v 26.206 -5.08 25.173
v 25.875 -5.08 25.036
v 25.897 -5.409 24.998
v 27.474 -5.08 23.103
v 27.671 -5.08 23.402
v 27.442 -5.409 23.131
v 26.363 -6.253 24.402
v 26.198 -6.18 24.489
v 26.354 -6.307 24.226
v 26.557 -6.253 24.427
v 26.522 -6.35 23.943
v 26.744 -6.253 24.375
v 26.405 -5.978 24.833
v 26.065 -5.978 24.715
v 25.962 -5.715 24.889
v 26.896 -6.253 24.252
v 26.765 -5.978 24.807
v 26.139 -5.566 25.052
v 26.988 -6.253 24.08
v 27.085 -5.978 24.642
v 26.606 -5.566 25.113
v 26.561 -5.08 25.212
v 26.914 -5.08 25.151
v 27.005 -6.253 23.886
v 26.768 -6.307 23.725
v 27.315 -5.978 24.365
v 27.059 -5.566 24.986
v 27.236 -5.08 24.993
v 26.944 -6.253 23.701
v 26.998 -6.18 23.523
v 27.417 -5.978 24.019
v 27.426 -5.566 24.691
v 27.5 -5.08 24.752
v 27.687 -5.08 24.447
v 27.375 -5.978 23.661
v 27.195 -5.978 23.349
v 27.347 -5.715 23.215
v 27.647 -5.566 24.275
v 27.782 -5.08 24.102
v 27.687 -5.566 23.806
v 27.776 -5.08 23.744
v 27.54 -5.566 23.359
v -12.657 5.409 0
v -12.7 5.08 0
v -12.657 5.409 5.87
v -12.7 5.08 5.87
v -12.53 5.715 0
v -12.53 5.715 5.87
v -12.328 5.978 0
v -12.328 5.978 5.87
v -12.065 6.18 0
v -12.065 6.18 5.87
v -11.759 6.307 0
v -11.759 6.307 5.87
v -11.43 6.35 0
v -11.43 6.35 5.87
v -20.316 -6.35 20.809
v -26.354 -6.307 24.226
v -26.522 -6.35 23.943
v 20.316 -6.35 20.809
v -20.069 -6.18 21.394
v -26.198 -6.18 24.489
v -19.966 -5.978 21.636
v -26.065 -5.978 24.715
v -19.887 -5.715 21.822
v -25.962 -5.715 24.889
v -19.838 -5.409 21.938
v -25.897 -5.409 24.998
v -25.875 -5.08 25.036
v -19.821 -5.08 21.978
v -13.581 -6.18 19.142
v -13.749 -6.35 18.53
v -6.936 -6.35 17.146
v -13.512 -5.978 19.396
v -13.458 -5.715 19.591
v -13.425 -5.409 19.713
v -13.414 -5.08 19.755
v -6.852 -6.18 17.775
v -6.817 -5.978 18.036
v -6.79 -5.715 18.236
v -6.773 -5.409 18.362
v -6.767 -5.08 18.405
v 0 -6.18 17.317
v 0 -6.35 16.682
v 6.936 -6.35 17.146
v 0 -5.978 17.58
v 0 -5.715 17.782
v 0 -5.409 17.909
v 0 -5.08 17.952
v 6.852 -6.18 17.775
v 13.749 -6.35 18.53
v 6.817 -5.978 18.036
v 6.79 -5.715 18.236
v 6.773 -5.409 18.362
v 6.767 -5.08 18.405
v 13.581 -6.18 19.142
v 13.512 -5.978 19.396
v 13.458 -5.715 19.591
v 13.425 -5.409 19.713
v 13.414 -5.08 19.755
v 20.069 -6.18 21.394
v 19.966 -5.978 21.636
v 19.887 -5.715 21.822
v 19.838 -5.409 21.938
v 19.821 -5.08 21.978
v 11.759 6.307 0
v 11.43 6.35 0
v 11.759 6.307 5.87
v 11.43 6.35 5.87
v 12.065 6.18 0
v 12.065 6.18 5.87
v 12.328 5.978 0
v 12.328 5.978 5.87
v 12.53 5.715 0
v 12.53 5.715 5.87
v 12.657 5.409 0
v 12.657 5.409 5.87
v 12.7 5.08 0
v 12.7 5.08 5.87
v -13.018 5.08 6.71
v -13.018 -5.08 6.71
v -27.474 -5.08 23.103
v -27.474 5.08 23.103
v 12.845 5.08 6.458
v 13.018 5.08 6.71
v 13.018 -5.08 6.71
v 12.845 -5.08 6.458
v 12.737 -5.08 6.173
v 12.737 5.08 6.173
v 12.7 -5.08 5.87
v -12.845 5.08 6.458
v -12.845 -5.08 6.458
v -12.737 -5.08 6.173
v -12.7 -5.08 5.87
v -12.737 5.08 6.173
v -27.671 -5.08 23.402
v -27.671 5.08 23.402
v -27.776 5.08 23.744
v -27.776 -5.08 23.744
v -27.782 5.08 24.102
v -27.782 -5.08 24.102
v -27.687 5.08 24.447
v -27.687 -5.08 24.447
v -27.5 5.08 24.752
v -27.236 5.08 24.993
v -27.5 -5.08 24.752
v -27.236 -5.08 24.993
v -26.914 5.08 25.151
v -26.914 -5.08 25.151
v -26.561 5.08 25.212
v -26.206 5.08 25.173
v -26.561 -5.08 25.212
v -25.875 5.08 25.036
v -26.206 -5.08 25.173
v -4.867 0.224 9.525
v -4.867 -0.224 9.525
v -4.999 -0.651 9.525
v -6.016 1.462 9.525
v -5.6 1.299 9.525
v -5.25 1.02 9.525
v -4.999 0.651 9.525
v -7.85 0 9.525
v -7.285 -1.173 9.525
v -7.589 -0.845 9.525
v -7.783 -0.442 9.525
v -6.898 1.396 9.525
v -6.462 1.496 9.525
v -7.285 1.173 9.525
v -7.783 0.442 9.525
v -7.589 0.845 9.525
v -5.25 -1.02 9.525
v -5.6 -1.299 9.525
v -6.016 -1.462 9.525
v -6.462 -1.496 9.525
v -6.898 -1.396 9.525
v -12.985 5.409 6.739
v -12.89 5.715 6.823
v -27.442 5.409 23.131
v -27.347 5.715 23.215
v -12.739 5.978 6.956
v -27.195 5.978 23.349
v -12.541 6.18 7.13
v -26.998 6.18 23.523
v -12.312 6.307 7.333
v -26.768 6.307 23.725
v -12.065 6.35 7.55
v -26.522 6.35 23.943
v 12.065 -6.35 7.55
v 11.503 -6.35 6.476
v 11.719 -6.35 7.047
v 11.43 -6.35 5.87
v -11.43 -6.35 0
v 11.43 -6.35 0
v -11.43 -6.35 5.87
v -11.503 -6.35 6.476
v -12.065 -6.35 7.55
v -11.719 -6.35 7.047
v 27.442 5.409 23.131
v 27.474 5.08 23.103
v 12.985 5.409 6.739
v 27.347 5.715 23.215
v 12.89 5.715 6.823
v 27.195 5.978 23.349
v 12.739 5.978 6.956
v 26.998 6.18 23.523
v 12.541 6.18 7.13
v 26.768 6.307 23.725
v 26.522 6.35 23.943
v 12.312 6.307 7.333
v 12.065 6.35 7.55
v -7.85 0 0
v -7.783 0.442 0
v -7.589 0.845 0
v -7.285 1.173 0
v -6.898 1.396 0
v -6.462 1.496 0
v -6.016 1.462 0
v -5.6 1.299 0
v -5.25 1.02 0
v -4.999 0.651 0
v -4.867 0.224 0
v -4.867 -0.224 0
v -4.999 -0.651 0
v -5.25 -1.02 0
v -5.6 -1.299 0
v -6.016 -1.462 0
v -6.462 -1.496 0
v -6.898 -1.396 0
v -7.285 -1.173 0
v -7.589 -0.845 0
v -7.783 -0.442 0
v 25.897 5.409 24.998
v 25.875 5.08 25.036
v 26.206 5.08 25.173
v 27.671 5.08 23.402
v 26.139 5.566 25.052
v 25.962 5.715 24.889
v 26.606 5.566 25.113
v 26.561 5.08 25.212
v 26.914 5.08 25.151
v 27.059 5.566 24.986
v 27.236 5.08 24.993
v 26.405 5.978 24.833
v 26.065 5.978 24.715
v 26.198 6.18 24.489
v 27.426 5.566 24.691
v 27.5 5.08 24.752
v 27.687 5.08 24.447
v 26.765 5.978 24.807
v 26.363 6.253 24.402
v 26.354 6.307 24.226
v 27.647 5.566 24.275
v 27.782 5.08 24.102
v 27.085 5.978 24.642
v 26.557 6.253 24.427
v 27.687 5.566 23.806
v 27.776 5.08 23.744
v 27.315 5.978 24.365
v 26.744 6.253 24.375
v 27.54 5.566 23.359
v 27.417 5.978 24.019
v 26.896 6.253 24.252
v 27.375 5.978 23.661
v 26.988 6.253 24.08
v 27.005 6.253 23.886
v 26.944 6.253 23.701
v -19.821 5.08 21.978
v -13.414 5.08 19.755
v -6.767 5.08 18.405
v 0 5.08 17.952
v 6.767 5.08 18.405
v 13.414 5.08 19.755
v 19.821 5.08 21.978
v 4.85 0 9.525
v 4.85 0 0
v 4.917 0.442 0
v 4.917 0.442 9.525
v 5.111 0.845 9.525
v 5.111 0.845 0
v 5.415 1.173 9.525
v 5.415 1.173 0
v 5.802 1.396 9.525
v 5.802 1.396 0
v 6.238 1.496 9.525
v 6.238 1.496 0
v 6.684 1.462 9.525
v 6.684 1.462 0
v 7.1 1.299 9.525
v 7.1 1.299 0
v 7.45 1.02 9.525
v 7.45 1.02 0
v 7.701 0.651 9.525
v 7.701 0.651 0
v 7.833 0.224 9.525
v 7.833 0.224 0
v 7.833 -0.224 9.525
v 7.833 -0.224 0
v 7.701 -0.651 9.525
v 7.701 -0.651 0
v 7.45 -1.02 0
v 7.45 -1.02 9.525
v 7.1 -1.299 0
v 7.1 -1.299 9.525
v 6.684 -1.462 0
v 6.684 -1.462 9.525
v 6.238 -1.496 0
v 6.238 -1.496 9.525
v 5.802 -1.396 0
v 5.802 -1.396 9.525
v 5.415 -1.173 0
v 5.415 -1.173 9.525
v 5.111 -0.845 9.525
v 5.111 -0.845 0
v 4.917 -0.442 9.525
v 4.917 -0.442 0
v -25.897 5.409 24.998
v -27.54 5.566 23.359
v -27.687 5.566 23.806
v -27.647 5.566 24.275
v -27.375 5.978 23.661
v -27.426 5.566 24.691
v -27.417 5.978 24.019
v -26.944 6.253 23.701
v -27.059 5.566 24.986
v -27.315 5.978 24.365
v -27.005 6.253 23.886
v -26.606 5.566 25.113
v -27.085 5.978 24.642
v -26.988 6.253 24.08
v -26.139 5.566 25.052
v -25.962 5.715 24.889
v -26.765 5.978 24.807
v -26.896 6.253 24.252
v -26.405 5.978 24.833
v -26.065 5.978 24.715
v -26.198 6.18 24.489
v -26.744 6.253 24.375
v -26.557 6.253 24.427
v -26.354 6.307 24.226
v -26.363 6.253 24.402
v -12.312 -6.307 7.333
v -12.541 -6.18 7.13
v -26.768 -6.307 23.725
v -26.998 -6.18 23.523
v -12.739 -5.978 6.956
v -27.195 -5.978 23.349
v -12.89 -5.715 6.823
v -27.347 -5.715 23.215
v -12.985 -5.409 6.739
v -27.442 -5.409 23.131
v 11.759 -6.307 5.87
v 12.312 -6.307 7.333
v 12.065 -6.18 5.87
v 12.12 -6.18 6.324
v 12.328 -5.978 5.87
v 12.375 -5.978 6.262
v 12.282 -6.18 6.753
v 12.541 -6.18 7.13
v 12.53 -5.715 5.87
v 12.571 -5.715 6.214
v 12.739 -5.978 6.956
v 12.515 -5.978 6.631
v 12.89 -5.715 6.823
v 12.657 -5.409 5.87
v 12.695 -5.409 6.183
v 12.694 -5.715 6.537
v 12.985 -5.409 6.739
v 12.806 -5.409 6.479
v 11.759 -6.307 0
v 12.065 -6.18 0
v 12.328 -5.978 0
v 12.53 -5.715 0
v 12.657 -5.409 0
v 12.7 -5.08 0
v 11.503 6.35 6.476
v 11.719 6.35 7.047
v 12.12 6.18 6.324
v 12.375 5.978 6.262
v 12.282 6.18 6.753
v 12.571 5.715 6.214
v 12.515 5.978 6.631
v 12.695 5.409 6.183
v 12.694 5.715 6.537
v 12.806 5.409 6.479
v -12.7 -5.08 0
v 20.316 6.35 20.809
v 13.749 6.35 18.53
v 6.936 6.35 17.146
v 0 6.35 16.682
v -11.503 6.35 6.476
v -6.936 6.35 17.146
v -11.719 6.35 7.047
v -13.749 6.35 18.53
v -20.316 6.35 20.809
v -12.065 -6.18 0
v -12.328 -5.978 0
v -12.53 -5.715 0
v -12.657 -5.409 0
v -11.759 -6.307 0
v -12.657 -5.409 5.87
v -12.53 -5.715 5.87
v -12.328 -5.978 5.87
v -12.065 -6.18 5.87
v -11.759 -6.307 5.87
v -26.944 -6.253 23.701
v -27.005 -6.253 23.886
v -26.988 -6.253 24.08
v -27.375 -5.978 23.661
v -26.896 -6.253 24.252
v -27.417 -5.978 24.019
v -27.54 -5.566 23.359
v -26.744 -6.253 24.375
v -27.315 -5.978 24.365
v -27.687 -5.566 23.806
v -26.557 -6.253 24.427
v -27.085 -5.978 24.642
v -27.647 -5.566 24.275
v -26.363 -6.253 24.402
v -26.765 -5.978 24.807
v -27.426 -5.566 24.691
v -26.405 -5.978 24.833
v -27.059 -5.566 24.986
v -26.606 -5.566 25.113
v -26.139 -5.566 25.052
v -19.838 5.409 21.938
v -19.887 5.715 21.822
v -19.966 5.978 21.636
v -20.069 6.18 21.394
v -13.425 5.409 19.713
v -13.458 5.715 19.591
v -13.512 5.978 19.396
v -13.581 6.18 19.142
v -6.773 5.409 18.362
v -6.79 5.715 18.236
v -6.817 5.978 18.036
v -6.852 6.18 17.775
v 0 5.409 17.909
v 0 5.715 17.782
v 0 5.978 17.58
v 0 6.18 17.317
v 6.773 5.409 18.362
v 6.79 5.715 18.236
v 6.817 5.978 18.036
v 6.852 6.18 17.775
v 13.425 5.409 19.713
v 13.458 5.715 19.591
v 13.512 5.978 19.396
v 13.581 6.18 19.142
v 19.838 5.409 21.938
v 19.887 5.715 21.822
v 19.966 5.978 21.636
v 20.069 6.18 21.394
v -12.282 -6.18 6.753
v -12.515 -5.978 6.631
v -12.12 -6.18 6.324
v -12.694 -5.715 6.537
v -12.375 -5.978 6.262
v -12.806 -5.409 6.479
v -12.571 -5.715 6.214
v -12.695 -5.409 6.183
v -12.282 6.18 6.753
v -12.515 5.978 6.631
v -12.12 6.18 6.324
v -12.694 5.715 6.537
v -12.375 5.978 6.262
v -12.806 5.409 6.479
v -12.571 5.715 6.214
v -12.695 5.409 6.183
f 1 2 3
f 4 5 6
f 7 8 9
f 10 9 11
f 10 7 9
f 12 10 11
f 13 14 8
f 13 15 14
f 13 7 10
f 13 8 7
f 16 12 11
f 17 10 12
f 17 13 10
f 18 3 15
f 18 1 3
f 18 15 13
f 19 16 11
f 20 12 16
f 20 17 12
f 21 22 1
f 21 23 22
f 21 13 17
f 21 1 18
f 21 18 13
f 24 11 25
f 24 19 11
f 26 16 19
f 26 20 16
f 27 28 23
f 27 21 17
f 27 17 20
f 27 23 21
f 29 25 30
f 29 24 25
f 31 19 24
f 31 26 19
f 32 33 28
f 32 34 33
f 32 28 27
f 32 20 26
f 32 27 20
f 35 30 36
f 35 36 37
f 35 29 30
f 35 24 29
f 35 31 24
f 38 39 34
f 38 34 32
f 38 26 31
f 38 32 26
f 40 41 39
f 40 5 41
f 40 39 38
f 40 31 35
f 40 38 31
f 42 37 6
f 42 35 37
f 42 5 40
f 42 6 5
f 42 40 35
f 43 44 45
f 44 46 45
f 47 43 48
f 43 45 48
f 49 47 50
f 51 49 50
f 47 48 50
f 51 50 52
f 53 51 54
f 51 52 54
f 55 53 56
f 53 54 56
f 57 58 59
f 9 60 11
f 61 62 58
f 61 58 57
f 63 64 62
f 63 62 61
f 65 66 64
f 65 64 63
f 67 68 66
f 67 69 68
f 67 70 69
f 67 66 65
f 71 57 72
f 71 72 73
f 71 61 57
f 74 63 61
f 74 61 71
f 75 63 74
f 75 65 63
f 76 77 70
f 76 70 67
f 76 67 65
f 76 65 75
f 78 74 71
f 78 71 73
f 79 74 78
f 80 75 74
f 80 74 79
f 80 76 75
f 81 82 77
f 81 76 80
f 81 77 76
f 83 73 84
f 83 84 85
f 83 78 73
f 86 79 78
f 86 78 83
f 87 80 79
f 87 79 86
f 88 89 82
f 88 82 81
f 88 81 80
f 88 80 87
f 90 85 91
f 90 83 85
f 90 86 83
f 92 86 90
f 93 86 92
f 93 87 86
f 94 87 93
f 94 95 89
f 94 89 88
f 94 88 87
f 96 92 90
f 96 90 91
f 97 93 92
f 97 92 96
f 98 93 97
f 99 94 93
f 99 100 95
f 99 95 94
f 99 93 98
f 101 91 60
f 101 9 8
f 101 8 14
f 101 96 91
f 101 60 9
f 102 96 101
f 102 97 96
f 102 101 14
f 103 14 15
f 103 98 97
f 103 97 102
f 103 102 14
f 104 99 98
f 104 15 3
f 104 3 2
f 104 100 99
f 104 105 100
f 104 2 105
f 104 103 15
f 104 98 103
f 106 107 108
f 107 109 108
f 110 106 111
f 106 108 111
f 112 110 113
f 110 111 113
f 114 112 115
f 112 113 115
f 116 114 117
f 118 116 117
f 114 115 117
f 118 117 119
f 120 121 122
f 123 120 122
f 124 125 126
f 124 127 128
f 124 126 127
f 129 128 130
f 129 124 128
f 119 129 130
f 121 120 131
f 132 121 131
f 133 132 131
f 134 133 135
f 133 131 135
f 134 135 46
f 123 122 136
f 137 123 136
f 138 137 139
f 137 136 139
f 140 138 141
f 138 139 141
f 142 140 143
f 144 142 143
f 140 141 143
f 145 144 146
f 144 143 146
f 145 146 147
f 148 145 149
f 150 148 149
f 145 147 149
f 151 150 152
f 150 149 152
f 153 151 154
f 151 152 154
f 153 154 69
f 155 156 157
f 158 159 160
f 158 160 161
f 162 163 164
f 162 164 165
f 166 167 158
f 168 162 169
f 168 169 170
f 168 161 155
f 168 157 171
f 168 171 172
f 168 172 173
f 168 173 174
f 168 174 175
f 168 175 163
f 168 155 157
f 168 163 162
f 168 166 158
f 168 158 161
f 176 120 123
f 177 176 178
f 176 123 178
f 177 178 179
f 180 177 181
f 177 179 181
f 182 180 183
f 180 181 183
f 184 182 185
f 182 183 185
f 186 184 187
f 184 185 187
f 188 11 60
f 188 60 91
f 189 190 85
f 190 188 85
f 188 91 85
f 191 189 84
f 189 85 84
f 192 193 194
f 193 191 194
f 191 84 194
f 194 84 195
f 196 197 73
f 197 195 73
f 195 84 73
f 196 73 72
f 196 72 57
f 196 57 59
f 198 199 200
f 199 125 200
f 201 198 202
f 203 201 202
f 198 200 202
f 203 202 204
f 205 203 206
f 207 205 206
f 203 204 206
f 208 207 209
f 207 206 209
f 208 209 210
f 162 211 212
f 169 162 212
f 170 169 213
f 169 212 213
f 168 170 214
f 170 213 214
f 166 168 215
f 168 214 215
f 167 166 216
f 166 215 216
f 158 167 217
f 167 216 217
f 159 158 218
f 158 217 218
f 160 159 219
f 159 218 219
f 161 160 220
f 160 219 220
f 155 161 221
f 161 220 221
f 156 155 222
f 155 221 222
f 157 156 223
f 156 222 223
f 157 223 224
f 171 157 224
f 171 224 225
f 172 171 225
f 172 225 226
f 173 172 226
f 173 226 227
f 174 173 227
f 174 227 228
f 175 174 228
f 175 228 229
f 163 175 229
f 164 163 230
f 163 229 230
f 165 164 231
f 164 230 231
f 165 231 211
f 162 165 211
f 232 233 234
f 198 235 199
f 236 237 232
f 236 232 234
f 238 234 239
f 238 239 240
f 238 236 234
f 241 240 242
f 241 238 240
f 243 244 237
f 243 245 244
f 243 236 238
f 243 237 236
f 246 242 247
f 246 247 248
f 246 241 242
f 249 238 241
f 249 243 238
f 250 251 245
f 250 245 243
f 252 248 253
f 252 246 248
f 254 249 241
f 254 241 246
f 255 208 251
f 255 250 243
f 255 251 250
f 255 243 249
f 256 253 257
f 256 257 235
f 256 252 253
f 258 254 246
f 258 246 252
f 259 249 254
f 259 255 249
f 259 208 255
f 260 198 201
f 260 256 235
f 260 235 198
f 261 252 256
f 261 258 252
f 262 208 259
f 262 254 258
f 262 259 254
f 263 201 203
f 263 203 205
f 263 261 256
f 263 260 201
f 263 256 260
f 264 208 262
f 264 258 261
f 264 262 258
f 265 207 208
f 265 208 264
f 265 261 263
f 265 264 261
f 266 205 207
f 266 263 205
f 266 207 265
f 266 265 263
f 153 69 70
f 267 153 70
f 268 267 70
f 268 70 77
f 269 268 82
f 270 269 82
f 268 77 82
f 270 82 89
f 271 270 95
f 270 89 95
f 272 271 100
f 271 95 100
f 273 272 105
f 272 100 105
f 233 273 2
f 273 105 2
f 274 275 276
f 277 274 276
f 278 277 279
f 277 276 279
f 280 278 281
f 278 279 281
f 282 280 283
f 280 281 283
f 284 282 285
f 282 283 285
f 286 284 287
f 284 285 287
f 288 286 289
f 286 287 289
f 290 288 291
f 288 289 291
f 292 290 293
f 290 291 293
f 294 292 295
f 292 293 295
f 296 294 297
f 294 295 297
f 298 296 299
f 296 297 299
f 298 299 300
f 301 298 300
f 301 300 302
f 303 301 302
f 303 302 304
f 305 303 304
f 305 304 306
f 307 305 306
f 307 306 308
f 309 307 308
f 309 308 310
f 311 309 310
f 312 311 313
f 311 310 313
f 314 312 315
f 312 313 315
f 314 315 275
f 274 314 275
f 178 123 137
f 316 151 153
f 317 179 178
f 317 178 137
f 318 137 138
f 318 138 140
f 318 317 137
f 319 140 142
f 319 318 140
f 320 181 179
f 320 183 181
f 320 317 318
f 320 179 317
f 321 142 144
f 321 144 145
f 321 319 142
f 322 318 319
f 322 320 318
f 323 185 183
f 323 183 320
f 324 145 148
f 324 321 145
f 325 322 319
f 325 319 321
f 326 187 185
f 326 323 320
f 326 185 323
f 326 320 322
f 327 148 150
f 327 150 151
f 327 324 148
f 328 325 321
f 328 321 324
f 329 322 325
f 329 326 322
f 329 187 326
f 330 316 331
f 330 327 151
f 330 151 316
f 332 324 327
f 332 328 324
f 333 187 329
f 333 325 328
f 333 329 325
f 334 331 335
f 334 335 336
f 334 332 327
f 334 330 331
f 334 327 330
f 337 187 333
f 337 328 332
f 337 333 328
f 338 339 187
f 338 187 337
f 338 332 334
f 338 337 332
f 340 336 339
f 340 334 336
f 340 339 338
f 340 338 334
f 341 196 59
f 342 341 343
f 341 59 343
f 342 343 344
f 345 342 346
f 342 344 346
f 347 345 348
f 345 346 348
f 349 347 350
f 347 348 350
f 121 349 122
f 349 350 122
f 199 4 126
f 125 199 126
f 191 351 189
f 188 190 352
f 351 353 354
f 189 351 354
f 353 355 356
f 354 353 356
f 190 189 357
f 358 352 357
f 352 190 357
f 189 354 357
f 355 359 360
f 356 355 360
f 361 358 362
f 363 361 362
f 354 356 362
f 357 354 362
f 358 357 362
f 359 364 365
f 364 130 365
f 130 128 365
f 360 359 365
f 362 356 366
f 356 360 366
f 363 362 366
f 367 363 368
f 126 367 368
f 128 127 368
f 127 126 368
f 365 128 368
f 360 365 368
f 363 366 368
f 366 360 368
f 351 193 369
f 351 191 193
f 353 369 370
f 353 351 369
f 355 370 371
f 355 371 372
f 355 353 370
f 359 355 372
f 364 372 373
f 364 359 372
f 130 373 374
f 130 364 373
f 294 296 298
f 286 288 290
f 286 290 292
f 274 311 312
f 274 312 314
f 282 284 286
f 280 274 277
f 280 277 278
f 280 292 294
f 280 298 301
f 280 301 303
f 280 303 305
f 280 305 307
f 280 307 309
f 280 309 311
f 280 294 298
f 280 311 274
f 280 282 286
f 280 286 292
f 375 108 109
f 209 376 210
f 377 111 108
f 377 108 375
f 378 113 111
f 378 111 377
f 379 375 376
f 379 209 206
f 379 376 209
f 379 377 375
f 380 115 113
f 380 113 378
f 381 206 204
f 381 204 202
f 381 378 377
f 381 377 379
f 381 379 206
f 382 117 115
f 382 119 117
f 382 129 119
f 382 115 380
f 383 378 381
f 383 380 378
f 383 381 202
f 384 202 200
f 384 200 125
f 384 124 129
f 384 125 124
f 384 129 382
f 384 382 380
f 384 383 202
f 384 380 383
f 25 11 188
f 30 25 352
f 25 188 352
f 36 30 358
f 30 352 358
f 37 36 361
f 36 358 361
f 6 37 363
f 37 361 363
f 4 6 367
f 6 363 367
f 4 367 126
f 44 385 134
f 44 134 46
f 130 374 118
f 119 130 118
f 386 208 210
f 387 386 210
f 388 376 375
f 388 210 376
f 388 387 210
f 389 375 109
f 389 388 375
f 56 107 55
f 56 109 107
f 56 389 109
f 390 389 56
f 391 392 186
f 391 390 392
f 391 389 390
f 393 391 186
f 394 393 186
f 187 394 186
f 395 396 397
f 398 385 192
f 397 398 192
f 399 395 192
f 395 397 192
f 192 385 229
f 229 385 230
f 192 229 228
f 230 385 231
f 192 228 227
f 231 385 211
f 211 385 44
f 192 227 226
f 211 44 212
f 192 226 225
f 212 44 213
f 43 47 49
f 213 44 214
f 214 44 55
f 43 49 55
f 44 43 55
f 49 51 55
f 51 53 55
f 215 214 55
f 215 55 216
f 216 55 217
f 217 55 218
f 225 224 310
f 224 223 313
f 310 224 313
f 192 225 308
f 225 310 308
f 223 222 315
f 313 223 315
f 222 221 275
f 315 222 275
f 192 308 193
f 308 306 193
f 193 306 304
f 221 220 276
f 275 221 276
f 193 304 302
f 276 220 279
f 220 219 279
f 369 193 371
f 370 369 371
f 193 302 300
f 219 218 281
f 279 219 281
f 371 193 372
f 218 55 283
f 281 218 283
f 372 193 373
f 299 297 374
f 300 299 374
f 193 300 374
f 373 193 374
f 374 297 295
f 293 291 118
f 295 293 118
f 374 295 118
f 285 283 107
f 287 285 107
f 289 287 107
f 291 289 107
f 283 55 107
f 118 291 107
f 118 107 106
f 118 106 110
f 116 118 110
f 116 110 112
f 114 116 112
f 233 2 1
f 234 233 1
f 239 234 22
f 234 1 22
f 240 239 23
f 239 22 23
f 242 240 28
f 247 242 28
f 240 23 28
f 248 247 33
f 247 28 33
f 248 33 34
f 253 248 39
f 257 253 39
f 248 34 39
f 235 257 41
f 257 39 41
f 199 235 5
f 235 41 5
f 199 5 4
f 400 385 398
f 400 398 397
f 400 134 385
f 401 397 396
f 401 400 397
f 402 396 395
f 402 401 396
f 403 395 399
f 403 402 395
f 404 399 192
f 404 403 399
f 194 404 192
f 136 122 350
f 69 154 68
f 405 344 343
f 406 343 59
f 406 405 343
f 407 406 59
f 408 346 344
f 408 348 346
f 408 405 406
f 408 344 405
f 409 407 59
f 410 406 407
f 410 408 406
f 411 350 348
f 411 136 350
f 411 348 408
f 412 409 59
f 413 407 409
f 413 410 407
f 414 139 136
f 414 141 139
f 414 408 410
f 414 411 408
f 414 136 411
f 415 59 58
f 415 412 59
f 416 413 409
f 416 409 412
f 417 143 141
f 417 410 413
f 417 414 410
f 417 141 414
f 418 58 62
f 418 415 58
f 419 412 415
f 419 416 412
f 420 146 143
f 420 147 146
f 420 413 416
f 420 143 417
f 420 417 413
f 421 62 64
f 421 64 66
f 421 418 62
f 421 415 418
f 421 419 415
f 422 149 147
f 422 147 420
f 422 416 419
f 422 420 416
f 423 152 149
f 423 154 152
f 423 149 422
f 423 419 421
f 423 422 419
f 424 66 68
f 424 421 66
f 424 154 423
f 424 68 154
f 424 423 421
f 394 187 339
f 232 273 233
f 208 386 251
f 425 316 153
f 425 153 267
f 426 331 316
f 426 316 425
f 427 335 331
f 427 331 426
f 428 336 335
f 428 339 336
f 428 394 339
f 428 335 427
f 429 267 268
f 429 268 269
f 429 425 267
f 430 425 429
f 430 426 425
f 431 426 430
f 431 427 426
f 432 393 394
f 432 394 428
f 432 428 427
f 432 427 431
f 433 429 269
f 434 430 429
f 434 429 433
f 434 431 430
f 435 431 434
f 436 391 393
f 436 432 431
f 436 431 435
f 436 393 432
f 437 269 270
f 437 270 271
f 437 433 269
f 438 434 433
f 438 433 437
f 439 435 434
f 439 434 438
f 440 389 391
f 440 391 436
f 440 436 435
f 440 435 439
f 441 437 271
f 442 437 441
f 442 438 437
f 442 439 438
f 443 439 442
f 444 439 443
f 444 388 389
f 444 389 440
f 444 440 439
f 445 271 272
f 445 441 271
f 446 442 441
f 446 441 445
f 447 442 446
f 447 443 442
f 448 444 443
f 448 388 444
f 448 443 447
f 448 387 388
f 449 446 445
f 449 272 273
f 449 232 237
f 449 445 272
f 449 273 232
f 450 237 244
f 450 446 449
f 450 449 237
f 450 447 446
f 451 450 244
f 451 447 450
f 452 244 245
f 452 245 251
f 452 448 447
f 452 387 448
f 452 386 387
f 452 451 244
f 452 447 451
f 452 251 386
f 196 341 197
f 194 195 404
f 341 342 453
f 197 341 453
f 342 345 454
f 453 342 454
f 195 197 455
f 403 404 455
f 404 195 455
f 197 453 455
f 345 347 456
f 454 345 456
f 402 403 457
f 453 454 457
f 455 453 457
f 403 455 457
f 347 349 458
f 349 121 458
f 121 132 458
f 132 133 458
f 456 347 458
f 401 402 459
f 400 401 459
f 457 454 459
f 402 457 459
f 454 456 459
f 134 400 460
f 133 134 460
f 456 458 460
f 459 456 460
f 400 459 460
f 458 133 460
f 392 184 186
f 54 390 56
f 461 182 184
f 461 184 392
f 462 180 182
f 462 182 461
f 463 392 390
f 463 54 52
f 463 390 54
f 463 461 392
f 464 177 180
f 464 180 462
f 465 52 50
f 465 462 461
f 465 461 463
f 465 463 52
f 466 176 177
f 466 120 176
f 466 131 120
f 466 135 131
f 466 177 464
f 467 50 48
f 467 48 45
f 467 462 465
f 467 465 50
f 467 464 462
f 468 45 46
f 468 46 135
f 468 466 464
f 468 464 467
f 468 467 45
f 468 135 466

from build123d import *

# Parameters (mm, degrees)
ESQUISSE1_W             = 25.4
ESQUISSE1_H             = 12.7
BOSS_EXTRU_1_DEPTH      = 6.35
BOSS_EXTRU_2_DEPTH      = 12.7
CONG_1_R                = 1.27
ESQUISSE3_R             = 1.5
ENL_V_MAT_EXTRU_1_DEPTH = 9.525


with BuildPart() as part:
    # Esquisse1 → Boss.-Extru.1 (new body)
    with BuildSketch(Plane.XY):
        Rectangle(ESQUISSE1_W, ESQUISSE1_H)
    extrude(amount=BOSS_EXTRU_1_DEPTH)

    # Esquisse2 → Boss.-Extru.2 (add)
    with BuildSketch(Plane.XZ.offset(6.35)):
        with BuildLine():
            Line((-12.7, 6.35), (-27.474417663, 23.102614958))
            ThreePointArc((-27.474417663, 23.102614958), (-27.500391754, 24.752263413), (-25.875041622, 25.035550597))
            ThreePointArc((-25.875041622, 25.035550597), (0, 17.951934494), (25.875041622, 25.035550597))
            ThreePointArc((25.875041622, 25.035550597), (27.500391754, 24.752263413), (27.474417663, 23.102614958))
            Line((27.474417663, 23.102614958), (12.7, 6.35))
            Line((12.7, 6.35), (12.7, 0))
            Line((12.7, 0), (-12.7, 0))
            Line((-12.7, 0), (-12.7, 6.35))
        make_face()
    extrude(amount=-BOSS_EXTRU_2_DEPTH)

    # Congé1
    cong_1_edges = [part.edges().sort_by_distance(p)[0] for p in [
        (-12.7, 0, 6.35),
        (-20.087208832, 6.35, 14.726307479),
        (-27.500391754, 6.35, 24.752263413),
        (0, 6.35, 17.951934494),
        (27.500391754, 6.35, 24.752263413),
        (20.087208832, 6.35, 14.726307479),
        (20.087208832, -6.35, 14.726307479),
        (27.500391754, -6.35, 24.752263413),
        (0, -6.35, 17.951934494),
        (-27.500391754, -6.35, 24.752263413),
        (-20.087208832, -6.35, 14.726307479),
        (12.7, 0, 6.35),
        (12.7, -6.35, 3.175),
        (-12.7, -6.35, 3.175),
        (-12.7, 6.35, 3.175),
        (12.7, 6.35, 3.175),
    ]]
    fillet(cong_1_edges, radius=CONG_1_R)

    # Esquisse3 → Enlèv. mat.-Extru.1 (cut)
    with BuildSketch(Plane(origin=(0, 0, 0), x_dir=(-1, 0, 0), z_dir=(0, 0, -1))):
        with Locations((-6.35, 0)):
            Circle(ESQUISSE3_R)
        with Locations((6.35, 0)):
            Circle(ESQUISSE3_R)
    extrude(amount=-ENL_V_MAT_EXTRU_1_DEPTH, mode=Mode.SUBTRACT)


solid = part.part
